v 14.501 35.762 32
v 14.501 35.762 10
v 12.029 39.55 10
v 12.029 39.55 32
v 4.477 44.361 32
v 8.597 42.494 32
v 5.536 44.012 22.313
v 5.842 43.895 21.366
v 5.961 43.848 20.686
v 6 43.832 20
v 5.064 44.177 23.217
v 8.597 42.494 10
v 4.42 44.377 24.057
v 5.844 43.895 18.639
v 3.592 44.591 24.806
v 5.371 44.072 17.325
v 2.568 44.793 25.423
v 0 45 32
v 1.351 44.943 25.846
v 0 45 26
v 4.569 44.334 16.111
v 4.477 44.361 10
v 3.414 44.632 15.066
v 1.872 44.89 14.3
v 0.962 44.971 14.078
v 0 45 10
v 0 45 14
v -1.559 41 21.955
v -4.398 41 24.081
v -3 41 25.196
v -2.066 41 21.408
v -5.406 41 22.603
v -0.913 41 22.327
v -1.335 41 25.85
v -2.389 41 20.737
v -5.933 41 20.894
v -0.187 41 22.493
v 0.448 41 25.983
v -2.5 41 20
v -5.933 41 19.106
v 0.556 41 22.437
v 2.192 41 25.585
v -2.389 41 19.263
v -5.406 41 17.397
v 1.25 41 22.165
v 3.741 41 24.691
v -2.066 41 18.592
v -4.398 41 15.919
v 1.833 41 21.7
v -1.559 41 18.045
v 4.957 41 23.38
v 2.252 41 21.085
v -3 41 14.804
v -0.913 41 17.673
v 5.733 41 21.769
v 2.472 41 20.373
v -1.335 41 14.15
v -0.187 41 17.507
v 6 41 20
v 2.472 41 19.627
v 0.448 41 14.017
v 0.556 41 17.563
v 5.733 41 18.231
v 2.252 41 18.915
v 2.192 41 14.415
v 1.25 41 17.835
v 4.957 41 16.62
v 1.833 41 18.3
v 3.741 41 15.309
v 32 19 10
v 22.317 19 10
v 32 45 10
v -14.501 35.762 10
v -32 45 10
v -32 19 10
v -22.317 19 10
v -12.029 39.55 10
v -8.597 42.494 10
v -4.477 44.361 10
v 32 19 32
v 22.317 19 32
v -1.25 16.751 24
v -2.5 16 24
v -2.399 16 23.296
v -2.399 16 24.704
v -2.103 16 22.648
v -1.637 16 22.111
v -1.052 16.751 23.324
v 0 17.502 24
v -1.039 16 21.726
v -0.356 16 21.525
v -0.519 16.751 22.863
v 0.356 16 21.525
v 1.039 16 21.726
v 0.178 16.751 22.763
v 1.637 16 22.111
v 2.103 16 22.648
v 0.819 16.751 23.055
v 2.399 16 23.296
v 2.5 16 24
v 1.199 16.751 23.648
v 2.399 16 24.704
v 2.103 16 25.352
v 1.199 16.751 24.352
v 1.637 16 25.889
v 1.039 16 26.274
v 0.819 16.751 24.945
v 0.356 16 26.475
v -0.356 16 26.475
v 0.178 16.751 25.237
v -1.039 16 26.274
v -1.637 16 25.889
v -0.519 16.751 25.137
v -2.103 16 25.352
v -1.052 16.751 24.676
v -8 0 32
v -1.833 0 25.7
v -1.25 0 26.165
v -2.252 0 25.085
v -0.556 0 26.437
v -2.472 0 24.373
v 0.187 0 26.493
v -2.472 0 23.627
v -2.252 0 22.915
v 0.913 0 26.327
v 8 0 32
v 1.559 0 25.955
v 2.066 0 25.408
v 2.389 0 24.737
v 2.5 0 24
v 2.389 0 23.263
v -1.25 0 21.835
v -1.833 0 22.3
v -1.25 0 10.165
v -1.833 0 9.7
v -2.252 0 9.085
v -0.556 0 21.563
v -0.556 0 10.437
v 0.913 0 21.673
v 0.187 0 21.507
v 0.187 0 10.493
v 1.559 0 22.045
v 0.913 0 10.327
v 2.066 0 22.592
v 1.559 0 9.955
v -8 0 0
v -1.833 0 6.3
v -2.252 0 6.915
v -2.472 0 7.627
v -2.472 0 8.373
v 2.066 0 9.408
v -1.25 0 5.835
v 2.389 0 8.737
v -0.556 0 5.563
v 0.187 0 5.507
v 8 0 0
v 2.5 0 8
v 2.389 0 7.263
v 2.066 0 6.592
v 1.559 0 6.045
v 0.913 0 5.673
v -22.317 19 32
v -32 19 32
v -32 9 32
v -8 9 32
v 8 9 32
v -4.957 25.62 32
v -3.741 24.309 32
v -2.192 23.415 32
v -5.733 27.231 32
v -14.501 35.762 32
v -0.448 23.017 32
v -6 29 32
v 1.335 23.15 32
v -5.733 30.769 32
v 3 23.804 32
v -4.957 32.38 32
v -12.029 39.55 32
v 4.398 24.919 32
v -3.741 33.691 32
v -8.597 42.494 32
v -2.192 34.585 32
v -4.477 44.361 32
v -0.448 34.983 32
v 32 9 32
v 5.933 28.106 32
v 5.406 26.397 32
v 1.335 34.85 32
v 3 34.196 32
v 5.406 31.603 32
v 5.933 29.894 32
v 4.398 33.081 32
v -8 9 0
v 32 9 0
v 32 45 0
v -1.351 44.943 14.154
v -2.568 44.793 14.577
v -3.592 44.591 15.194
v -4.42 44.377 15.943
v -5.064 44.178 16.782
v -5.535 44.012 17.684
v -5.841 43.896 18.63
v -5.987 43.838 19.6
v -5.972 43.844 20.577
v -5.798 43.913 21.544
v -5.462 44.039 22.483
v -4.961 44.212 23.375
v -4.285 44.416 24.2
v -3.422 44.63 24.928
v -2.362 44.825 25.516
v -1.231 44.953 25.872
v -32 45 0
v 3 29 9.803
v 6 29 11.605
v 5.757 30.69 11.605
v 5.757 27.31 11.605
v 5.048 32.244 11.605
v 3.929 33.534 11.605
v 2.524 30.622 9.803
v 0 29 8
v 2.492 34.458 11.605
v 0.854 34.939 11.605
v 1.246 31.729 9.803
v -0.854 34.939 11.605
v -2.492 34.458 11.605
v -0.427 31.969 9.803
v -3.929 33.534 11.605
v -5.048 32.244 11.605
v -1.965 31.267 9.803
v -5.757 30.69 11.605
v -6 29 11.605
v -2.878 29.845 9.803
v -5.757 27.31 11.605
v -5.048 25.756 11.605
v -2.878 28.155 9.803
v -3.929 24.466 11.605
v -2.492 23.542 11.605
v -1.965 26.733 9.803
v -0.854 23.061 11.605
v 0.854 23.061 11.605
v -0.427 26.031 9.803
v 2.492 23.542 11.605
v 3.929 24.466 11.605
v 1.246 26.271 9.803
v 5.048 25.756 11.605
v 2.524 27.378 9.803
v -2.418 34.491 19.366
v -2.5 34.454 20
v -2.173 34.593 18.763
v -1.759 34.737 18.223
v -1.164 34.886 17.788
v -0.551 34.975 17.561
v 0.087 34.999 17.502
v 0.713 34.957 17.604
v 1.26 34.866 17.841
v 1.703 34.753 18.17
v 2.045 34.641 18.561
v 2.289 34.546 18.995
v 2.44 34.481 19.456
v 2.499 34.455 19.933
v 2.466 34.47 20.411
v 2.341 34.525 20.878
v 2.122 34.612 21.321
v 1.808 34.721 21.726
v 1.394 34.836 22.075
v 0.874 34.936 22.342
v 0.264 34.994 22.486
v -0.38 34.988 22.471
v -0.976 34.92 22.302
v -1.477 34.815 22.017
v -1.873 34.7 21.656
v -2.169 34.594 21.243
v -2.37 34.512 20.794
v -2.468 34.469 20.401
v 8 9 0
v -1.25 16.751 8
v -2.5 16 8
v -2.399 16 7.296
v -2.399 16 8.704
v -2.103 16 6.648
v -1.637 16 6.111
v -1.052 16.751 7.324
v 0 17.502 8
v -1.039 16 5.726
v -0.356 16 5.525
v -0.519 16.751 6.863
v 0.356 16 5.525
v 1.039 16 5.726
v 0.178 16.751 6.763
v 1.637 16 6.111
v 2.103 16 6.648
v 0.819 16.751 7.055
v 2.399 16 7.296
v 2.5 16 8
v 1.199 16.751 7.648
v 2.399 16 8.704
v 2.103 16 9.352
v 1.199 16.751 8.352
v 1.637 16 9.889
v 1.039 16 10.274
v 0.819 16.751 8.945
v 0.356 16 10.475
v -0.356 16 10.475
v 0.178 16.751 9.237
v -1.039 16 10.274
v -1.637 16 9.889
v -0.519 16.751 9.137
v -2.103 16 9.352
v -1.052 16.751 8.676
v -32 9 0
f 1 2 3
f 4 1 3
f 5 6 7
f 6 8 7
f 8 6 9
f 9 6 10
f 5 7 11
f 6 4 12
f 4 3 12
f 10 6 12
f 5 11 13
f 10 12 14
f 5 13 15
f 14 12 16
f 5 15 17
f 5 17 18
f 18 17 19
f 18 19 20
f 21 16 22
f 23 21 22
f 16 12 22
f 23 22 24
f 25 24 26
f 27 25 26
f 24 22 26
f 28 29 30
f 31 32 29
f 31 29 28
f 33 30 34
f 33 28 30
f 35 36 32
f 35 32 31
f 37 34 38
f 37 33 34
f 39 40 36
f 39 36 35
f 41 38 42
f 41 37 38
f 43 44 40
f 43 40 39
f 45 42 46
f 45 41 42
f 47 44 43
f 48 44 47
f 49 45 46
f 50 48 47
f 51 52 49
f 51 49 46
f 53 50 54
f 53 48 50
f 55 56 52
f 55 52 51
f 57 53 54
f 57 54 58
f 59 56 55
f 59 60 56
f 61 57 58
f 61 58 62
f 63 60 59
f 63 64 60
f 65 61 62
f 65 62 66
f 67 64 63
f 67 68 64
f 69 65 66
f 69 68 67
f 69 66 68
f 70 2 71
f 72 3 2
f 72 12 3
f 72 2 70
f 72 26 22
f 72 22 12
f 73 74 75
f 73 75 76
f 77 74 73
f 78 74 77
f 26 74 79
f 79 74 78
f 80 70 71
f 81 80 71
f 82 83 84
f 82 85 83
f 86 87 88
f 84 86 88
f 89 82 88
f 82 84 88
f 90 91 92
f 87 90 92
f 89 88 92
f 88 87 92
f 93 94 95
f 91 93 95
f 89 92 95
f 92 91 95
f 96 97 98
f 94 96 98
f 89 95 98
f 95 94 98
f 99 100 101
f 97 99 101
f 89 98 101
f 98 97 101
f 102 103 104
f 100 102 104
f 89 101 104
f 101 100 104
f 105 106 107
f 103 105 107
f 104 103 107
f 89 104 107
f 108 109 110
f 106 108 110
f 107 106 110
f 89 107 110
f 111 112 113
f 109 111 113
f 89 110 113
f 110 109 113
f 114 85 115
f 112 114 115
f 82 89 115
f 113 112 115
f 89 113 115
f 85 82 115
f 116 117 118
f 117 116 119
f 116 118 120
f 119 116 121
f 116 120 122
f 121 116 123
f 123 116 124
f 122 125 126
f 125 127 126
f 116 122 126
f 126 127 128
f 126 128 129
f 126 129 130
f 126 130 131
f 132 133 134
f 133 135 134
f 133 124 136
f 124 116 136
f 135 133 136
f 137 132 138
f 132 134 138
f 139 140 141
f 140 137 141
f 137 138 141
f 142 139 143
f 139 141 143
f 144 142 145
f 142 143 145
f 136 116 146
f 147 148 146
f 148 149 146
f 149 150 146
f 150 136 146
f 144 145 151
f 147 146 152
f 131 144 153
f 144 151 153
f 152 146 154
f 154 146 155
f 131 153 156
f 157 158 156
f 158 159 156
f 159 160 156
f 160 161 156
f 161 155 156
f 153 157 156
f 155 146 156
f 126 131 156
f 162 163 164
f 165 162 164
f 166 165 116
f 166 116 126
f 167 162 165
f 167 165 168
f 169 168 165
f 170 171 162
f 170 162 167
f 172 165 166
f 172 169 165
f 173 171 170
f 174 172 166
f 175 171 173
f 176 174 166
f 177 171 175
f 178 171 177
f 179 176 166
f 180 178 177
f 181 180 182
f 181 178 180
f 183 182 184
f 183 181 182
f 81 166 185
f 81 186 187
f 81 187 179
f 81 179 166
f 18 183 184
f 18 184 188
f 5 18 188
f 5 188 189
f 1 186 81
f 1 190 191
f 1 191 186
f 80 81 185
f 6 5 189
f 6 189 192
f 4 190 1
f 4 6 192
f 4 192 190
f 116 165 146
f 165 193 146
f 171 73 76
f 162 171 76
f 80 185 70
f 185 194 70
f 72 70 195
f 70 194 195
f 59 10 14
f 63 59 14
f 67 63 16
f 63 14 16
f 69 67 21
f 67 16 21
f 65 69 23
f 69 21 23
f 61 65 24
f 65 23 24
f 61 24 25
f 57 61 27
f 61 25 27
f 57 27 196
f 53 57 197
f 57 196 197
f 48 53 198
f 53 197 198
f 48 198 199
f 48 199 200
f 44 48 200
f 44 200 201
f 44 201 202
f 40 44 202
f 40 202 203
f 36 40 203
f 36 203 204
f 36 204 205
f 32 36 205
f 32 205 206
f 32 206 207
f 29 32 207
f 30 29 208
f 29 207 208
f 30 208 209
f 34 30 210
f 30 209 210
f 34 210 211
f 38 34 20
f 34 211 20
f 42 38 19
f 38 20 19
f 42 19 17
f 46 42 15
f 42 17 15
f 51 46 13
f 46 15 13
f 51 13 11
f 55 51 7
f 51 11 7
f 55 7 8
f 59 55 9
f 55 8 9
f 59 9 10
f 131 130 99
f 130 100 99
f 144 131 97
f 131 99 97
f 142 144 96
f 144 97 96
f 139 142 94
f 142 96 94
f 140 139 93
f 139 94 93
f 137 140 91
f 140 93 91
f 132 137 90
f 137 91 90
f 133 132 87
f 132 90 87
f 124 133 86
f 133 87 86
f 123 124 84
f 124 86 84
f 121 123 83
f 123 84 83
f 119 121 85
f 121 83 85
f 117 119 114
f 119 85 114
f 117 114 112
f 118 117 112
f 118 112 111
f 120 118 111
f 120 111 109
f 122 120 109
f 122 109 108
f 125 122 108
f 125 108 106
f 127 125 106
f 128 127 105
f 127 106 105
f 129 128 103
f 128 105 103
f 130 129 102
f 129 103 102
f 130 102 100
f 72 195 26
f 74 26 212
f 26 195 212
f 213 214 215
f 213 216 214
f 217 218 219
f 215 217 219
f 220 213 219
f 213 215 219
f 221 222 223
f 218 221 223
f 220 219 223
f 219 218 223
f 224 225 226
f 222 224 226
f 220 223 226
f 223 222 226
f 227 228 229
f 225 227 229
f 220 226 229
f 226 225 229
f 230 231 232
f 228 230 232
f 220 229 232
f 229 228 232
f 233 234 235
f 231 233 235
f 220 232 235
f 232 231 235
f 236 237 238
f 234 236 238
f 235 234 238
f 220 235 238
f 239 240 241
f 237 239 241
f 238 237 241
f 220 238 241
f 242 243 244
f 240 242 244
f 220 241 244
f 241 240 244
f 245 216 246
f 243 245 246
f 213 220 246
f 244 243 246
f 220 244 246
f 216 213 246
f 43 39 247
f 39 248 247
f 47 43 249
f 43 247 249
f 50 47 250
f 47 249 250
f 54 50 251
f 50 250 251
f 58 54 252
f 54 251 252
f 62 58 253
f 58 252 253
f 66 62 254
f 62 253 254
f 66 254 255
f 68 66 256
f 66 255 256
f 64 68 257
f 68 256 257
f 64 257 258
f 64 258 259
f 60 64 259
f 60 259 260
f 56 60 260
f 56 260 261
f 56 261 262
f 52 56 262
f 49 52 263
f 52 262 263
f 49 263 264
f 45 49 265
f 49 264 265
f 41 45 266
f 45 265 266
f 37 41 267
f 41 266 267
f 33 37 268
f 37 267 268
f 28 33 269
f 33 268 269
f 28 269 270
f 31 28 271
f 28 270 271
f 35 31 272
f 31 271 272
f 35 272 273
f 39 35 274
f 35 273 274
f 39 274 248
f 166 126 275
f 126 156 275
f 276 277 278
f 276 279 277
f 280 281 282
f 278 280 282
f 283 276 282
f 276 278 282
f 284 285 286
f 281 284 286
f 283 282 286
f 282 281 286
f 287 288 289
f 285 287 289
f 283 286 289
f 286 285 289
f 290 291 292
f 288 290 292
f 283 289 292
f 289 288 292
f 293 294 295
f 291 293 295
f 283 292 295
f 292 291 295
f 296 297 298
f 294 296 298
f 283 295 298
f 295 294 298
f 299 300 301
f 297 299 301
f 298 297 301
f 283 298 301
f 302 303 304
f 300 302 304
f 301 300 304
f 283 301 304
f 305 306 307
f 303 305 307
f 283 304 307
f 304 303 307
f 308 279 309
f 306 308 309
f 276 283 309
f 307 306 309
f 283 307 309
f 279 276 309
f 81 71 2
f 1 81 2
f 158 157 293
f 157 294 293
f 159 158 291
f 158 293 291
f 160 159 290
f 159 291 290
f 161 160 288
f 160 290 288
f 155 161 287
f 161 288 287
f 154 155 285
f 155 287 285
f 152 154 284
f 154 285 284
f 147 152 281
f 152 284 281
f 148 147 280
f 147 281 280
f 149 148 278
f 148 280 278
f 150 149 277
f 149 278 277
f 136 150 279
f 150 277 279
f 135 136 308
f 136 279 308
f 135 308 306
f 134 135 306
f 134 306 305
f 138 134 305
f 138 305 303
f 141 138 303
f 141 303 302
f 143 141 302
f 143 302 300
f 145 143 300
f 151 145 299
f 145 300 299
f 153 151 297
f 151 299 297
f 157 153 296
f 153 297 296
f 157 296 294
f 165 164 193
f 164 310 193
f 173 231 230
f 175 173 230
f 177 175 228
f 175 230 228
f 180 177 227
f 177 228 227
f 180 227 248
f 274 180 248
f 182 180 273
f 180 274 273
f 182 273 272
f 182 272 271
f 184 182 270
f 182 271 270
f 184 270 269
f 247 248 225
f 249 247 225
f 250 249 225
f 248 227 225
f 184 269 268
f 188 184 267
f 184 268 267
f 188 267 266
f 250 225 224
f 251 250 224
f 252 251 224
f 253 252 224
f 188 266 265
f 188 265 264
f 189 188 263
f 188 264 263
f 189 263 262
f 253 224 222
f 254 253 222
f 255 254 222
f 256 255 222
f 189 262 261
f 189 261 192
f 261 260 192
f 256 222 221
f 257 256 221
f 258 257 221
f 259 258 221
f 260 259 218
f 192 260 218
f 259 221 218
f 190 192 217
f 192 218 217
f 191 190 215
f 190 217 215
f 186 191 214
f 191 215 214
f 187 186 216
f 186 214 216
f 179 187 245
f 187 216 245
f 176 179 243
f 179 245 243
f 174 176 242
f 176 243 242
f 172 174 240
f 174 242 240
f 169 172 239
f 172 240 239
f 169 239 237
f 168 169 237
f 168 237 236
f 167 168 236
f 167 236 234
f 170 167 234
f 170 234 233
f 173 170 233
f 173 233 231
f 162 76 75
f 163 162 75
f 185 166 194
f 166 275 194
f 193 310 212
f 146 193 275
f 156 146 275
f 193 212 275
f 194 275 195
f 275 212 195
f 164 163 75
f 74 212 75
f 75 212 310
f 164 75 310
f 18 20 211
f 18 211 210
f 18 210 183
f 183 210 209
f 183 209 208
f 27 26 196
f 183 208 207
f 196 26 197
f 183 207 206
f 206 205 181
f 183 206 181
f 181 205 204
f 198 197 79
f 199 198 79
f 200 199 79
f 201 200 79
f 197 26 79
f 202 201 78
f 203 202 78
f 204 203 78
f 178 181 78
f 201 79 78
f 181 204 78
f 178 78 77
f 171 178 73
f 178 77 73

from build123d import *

# Parameters (mm, degrees)
BOSS_EXTRUDE1_DEPTH                   = 10
BOSS_EXTRUDE2_DEPTH                   = 22
F_12_0MM_DOWEL_HOLE1_D                = 12
F_12_0MM_DOWEL_HOLE1_DEPTH            = 20.394836286
F_12_0MM_DOWEL_HOLE1_TIP              = 3.605163714
TAP_DRILL_FOR_M6X1_0_TAP1_D           = 5
TAP_DRILL_FOR_M6X1_0_TAP1_DEPTH       = 16
TAP_DRILL_FOR_M6X1_0_TAP1_TIP         = 1.502151548
TAP_DRILL_FOR_M6X1_0_TAP3_D           = 5
TAP_DRILL_FOR_M6X1_0_TAP3_DEPTH       = 16
TAP_DRILL_FOR_M6X1_0_TAP3_CSINK_D     = 5.05
TAP_DRILL_FOR_M6X1_0_TAP3_CSINK_ANGLE = 100
TAP_DRILL_FOR_M6X1_0_TAP3_TIP         = 1.502151548
SKETCH13_R                            = 6
CUT_EXTRUDE1_DEPTH                    = 4


with BuildPart() as part:
    # Sketch1 → Boss-Extrude1 (new body)
    with BuildSketch(Plane.XY):
        Polygon((-32, 9), (-8, 9), (-8, 0), (8, 0), (8, 9), (32, 9), (32, 45), (-32, 45), align=None)
    extrude(amount=BOSS_EXTRUDE1_DEPTH)

    # Sketch3 → Boss-Extrude2 (add)
    with BuildSketch(Plane.XY.offset(10)):
        with BuildLine():
            Line((-32, 19), (-32, 9))
            Line((-32, 9), (-8, 9))
            Line((-8, 9), (-8, 0))
            Line((-8, 0), (8, 0))
            Line((8, 0), (8, 9))
            Line((8, 9), (32, 9))
            Line((32, 9), (32, 19))
            Line((32, 19), (22.317123285, 19))
            Line((22.317123285, 19), (14.500924593, 35.761892188))
            ThreePointArc((14.500924593, 35.761892188), (8.596793696, 42.494263157), (-8.8e-08, 45))
            ThreePointArc((-8.8e-08, 45), (-8.596793771, 42.494263109), (-14.500924593, 35.761892188))
            Line((-14.500924593, 35.761892188), (-22.317123285, 19))
            Line((-22.317123285, 19), (-32, 19))
        make_face()
    extrude(amount=BOSS_EXTRUDE2_DEPTH)

    # Ø12.0mm Dowel Hole1
    with Locations(Plane.XY.offset(32)):
        with Locations((0, 29)):
            Hole(F_12_0MM_DOWEL_HOLE1_D / 2, depth=F_12_0MM_DOWEL_HOLE1_DEPTH)
            with Locations((0, 0, -(F_12_0MM_DOWEL_HOLE1_DEPTH + F_12_0MM_DOWEL_HOLE1_TIP / 2))):  # 118° drill point
                Cone(0, F_12_0MM_DOWEL_HOLE1_D / 2, F_12_0MM_DOWEL_HOLE1_TIP, mode=Mode.SUBTRACT)

    # Tap Drill for M6x1.0 Tap1
    with Locations(Plane(origin=(0, 0, 0), x_dir=(-1, 0, 0), z_dir=(0, -1, 0))):
        with Locations((0, -8), (0, -24)):
            Hole(TAP_DRILL_FOR_M6X1_0_TAP1_D / 2, depth=TAP_DRILL_FOR_M6X1_0_TAP1_DEPTH)
            with Locations((0, 0, -(TAP_DRILL_FOR_M6X1_0_TAP1_DEPTH + TAP_DRILL_FOR_M6X1_0_TAP1_TIP / 2))):  # 118° drill point
                Cone(0, TAP_DRILL_FOR_M6X1_0_TAP1_D / 2, TAP_DRILL_FOR_M6X1_0_TAP1_TIP, mode=Mode.SUBTRACT)

    # Tap Drill for M6x1.0 Tap3
    with Locations(Plane(origin=(0, 45, 20), x_dir=(1, 0, 0), z_dir=(0, 1, 0))):
        with Locations((0, 0)):
            CounterSinkHole(TAP_DRILL_FOR_M6X1_0_TAP3_D / 2, TAP_DRILL_FOR_M6X1_0_TAP3_CSINK_D / 2, depth=TAP_DRILL_FOR_M6X1_0_TAP3_DEPTH, counter_sink_angle=TAP_DRILL_FOR_M6X1_0_TAP3_CSINK_ANGLE)
            with Locations((0, 0, -(TAP_DRILL_FOR_M6X1_0_TAP3_DEPTH + TAP_DRILL_FOR_M6X1_0_TAP3_TIP / 2))):  # 118° drill point
                Cone(0, TAP_DRILL_FOR_M6X1_0_TAP3_D / 2, TAP_DRILL_FOR_M6X1_0_TAP3_TIP, mode=Mode.SUBTRACT)

    # Sketch13 → Cut-Extrude1 (cut)
    with BuildSketch(Plane(origin=(0, 45, 0), x_dir=(1, 0, 0), z_dir=(0, 1, 0))):
        with Locations((0, -20)):
            Circle(SKETCH13_R)
    extrude(amount=-CUT_EXTRUDE1_DEPTH, mode=Mode.SUBTRACT)


solid = part.part
